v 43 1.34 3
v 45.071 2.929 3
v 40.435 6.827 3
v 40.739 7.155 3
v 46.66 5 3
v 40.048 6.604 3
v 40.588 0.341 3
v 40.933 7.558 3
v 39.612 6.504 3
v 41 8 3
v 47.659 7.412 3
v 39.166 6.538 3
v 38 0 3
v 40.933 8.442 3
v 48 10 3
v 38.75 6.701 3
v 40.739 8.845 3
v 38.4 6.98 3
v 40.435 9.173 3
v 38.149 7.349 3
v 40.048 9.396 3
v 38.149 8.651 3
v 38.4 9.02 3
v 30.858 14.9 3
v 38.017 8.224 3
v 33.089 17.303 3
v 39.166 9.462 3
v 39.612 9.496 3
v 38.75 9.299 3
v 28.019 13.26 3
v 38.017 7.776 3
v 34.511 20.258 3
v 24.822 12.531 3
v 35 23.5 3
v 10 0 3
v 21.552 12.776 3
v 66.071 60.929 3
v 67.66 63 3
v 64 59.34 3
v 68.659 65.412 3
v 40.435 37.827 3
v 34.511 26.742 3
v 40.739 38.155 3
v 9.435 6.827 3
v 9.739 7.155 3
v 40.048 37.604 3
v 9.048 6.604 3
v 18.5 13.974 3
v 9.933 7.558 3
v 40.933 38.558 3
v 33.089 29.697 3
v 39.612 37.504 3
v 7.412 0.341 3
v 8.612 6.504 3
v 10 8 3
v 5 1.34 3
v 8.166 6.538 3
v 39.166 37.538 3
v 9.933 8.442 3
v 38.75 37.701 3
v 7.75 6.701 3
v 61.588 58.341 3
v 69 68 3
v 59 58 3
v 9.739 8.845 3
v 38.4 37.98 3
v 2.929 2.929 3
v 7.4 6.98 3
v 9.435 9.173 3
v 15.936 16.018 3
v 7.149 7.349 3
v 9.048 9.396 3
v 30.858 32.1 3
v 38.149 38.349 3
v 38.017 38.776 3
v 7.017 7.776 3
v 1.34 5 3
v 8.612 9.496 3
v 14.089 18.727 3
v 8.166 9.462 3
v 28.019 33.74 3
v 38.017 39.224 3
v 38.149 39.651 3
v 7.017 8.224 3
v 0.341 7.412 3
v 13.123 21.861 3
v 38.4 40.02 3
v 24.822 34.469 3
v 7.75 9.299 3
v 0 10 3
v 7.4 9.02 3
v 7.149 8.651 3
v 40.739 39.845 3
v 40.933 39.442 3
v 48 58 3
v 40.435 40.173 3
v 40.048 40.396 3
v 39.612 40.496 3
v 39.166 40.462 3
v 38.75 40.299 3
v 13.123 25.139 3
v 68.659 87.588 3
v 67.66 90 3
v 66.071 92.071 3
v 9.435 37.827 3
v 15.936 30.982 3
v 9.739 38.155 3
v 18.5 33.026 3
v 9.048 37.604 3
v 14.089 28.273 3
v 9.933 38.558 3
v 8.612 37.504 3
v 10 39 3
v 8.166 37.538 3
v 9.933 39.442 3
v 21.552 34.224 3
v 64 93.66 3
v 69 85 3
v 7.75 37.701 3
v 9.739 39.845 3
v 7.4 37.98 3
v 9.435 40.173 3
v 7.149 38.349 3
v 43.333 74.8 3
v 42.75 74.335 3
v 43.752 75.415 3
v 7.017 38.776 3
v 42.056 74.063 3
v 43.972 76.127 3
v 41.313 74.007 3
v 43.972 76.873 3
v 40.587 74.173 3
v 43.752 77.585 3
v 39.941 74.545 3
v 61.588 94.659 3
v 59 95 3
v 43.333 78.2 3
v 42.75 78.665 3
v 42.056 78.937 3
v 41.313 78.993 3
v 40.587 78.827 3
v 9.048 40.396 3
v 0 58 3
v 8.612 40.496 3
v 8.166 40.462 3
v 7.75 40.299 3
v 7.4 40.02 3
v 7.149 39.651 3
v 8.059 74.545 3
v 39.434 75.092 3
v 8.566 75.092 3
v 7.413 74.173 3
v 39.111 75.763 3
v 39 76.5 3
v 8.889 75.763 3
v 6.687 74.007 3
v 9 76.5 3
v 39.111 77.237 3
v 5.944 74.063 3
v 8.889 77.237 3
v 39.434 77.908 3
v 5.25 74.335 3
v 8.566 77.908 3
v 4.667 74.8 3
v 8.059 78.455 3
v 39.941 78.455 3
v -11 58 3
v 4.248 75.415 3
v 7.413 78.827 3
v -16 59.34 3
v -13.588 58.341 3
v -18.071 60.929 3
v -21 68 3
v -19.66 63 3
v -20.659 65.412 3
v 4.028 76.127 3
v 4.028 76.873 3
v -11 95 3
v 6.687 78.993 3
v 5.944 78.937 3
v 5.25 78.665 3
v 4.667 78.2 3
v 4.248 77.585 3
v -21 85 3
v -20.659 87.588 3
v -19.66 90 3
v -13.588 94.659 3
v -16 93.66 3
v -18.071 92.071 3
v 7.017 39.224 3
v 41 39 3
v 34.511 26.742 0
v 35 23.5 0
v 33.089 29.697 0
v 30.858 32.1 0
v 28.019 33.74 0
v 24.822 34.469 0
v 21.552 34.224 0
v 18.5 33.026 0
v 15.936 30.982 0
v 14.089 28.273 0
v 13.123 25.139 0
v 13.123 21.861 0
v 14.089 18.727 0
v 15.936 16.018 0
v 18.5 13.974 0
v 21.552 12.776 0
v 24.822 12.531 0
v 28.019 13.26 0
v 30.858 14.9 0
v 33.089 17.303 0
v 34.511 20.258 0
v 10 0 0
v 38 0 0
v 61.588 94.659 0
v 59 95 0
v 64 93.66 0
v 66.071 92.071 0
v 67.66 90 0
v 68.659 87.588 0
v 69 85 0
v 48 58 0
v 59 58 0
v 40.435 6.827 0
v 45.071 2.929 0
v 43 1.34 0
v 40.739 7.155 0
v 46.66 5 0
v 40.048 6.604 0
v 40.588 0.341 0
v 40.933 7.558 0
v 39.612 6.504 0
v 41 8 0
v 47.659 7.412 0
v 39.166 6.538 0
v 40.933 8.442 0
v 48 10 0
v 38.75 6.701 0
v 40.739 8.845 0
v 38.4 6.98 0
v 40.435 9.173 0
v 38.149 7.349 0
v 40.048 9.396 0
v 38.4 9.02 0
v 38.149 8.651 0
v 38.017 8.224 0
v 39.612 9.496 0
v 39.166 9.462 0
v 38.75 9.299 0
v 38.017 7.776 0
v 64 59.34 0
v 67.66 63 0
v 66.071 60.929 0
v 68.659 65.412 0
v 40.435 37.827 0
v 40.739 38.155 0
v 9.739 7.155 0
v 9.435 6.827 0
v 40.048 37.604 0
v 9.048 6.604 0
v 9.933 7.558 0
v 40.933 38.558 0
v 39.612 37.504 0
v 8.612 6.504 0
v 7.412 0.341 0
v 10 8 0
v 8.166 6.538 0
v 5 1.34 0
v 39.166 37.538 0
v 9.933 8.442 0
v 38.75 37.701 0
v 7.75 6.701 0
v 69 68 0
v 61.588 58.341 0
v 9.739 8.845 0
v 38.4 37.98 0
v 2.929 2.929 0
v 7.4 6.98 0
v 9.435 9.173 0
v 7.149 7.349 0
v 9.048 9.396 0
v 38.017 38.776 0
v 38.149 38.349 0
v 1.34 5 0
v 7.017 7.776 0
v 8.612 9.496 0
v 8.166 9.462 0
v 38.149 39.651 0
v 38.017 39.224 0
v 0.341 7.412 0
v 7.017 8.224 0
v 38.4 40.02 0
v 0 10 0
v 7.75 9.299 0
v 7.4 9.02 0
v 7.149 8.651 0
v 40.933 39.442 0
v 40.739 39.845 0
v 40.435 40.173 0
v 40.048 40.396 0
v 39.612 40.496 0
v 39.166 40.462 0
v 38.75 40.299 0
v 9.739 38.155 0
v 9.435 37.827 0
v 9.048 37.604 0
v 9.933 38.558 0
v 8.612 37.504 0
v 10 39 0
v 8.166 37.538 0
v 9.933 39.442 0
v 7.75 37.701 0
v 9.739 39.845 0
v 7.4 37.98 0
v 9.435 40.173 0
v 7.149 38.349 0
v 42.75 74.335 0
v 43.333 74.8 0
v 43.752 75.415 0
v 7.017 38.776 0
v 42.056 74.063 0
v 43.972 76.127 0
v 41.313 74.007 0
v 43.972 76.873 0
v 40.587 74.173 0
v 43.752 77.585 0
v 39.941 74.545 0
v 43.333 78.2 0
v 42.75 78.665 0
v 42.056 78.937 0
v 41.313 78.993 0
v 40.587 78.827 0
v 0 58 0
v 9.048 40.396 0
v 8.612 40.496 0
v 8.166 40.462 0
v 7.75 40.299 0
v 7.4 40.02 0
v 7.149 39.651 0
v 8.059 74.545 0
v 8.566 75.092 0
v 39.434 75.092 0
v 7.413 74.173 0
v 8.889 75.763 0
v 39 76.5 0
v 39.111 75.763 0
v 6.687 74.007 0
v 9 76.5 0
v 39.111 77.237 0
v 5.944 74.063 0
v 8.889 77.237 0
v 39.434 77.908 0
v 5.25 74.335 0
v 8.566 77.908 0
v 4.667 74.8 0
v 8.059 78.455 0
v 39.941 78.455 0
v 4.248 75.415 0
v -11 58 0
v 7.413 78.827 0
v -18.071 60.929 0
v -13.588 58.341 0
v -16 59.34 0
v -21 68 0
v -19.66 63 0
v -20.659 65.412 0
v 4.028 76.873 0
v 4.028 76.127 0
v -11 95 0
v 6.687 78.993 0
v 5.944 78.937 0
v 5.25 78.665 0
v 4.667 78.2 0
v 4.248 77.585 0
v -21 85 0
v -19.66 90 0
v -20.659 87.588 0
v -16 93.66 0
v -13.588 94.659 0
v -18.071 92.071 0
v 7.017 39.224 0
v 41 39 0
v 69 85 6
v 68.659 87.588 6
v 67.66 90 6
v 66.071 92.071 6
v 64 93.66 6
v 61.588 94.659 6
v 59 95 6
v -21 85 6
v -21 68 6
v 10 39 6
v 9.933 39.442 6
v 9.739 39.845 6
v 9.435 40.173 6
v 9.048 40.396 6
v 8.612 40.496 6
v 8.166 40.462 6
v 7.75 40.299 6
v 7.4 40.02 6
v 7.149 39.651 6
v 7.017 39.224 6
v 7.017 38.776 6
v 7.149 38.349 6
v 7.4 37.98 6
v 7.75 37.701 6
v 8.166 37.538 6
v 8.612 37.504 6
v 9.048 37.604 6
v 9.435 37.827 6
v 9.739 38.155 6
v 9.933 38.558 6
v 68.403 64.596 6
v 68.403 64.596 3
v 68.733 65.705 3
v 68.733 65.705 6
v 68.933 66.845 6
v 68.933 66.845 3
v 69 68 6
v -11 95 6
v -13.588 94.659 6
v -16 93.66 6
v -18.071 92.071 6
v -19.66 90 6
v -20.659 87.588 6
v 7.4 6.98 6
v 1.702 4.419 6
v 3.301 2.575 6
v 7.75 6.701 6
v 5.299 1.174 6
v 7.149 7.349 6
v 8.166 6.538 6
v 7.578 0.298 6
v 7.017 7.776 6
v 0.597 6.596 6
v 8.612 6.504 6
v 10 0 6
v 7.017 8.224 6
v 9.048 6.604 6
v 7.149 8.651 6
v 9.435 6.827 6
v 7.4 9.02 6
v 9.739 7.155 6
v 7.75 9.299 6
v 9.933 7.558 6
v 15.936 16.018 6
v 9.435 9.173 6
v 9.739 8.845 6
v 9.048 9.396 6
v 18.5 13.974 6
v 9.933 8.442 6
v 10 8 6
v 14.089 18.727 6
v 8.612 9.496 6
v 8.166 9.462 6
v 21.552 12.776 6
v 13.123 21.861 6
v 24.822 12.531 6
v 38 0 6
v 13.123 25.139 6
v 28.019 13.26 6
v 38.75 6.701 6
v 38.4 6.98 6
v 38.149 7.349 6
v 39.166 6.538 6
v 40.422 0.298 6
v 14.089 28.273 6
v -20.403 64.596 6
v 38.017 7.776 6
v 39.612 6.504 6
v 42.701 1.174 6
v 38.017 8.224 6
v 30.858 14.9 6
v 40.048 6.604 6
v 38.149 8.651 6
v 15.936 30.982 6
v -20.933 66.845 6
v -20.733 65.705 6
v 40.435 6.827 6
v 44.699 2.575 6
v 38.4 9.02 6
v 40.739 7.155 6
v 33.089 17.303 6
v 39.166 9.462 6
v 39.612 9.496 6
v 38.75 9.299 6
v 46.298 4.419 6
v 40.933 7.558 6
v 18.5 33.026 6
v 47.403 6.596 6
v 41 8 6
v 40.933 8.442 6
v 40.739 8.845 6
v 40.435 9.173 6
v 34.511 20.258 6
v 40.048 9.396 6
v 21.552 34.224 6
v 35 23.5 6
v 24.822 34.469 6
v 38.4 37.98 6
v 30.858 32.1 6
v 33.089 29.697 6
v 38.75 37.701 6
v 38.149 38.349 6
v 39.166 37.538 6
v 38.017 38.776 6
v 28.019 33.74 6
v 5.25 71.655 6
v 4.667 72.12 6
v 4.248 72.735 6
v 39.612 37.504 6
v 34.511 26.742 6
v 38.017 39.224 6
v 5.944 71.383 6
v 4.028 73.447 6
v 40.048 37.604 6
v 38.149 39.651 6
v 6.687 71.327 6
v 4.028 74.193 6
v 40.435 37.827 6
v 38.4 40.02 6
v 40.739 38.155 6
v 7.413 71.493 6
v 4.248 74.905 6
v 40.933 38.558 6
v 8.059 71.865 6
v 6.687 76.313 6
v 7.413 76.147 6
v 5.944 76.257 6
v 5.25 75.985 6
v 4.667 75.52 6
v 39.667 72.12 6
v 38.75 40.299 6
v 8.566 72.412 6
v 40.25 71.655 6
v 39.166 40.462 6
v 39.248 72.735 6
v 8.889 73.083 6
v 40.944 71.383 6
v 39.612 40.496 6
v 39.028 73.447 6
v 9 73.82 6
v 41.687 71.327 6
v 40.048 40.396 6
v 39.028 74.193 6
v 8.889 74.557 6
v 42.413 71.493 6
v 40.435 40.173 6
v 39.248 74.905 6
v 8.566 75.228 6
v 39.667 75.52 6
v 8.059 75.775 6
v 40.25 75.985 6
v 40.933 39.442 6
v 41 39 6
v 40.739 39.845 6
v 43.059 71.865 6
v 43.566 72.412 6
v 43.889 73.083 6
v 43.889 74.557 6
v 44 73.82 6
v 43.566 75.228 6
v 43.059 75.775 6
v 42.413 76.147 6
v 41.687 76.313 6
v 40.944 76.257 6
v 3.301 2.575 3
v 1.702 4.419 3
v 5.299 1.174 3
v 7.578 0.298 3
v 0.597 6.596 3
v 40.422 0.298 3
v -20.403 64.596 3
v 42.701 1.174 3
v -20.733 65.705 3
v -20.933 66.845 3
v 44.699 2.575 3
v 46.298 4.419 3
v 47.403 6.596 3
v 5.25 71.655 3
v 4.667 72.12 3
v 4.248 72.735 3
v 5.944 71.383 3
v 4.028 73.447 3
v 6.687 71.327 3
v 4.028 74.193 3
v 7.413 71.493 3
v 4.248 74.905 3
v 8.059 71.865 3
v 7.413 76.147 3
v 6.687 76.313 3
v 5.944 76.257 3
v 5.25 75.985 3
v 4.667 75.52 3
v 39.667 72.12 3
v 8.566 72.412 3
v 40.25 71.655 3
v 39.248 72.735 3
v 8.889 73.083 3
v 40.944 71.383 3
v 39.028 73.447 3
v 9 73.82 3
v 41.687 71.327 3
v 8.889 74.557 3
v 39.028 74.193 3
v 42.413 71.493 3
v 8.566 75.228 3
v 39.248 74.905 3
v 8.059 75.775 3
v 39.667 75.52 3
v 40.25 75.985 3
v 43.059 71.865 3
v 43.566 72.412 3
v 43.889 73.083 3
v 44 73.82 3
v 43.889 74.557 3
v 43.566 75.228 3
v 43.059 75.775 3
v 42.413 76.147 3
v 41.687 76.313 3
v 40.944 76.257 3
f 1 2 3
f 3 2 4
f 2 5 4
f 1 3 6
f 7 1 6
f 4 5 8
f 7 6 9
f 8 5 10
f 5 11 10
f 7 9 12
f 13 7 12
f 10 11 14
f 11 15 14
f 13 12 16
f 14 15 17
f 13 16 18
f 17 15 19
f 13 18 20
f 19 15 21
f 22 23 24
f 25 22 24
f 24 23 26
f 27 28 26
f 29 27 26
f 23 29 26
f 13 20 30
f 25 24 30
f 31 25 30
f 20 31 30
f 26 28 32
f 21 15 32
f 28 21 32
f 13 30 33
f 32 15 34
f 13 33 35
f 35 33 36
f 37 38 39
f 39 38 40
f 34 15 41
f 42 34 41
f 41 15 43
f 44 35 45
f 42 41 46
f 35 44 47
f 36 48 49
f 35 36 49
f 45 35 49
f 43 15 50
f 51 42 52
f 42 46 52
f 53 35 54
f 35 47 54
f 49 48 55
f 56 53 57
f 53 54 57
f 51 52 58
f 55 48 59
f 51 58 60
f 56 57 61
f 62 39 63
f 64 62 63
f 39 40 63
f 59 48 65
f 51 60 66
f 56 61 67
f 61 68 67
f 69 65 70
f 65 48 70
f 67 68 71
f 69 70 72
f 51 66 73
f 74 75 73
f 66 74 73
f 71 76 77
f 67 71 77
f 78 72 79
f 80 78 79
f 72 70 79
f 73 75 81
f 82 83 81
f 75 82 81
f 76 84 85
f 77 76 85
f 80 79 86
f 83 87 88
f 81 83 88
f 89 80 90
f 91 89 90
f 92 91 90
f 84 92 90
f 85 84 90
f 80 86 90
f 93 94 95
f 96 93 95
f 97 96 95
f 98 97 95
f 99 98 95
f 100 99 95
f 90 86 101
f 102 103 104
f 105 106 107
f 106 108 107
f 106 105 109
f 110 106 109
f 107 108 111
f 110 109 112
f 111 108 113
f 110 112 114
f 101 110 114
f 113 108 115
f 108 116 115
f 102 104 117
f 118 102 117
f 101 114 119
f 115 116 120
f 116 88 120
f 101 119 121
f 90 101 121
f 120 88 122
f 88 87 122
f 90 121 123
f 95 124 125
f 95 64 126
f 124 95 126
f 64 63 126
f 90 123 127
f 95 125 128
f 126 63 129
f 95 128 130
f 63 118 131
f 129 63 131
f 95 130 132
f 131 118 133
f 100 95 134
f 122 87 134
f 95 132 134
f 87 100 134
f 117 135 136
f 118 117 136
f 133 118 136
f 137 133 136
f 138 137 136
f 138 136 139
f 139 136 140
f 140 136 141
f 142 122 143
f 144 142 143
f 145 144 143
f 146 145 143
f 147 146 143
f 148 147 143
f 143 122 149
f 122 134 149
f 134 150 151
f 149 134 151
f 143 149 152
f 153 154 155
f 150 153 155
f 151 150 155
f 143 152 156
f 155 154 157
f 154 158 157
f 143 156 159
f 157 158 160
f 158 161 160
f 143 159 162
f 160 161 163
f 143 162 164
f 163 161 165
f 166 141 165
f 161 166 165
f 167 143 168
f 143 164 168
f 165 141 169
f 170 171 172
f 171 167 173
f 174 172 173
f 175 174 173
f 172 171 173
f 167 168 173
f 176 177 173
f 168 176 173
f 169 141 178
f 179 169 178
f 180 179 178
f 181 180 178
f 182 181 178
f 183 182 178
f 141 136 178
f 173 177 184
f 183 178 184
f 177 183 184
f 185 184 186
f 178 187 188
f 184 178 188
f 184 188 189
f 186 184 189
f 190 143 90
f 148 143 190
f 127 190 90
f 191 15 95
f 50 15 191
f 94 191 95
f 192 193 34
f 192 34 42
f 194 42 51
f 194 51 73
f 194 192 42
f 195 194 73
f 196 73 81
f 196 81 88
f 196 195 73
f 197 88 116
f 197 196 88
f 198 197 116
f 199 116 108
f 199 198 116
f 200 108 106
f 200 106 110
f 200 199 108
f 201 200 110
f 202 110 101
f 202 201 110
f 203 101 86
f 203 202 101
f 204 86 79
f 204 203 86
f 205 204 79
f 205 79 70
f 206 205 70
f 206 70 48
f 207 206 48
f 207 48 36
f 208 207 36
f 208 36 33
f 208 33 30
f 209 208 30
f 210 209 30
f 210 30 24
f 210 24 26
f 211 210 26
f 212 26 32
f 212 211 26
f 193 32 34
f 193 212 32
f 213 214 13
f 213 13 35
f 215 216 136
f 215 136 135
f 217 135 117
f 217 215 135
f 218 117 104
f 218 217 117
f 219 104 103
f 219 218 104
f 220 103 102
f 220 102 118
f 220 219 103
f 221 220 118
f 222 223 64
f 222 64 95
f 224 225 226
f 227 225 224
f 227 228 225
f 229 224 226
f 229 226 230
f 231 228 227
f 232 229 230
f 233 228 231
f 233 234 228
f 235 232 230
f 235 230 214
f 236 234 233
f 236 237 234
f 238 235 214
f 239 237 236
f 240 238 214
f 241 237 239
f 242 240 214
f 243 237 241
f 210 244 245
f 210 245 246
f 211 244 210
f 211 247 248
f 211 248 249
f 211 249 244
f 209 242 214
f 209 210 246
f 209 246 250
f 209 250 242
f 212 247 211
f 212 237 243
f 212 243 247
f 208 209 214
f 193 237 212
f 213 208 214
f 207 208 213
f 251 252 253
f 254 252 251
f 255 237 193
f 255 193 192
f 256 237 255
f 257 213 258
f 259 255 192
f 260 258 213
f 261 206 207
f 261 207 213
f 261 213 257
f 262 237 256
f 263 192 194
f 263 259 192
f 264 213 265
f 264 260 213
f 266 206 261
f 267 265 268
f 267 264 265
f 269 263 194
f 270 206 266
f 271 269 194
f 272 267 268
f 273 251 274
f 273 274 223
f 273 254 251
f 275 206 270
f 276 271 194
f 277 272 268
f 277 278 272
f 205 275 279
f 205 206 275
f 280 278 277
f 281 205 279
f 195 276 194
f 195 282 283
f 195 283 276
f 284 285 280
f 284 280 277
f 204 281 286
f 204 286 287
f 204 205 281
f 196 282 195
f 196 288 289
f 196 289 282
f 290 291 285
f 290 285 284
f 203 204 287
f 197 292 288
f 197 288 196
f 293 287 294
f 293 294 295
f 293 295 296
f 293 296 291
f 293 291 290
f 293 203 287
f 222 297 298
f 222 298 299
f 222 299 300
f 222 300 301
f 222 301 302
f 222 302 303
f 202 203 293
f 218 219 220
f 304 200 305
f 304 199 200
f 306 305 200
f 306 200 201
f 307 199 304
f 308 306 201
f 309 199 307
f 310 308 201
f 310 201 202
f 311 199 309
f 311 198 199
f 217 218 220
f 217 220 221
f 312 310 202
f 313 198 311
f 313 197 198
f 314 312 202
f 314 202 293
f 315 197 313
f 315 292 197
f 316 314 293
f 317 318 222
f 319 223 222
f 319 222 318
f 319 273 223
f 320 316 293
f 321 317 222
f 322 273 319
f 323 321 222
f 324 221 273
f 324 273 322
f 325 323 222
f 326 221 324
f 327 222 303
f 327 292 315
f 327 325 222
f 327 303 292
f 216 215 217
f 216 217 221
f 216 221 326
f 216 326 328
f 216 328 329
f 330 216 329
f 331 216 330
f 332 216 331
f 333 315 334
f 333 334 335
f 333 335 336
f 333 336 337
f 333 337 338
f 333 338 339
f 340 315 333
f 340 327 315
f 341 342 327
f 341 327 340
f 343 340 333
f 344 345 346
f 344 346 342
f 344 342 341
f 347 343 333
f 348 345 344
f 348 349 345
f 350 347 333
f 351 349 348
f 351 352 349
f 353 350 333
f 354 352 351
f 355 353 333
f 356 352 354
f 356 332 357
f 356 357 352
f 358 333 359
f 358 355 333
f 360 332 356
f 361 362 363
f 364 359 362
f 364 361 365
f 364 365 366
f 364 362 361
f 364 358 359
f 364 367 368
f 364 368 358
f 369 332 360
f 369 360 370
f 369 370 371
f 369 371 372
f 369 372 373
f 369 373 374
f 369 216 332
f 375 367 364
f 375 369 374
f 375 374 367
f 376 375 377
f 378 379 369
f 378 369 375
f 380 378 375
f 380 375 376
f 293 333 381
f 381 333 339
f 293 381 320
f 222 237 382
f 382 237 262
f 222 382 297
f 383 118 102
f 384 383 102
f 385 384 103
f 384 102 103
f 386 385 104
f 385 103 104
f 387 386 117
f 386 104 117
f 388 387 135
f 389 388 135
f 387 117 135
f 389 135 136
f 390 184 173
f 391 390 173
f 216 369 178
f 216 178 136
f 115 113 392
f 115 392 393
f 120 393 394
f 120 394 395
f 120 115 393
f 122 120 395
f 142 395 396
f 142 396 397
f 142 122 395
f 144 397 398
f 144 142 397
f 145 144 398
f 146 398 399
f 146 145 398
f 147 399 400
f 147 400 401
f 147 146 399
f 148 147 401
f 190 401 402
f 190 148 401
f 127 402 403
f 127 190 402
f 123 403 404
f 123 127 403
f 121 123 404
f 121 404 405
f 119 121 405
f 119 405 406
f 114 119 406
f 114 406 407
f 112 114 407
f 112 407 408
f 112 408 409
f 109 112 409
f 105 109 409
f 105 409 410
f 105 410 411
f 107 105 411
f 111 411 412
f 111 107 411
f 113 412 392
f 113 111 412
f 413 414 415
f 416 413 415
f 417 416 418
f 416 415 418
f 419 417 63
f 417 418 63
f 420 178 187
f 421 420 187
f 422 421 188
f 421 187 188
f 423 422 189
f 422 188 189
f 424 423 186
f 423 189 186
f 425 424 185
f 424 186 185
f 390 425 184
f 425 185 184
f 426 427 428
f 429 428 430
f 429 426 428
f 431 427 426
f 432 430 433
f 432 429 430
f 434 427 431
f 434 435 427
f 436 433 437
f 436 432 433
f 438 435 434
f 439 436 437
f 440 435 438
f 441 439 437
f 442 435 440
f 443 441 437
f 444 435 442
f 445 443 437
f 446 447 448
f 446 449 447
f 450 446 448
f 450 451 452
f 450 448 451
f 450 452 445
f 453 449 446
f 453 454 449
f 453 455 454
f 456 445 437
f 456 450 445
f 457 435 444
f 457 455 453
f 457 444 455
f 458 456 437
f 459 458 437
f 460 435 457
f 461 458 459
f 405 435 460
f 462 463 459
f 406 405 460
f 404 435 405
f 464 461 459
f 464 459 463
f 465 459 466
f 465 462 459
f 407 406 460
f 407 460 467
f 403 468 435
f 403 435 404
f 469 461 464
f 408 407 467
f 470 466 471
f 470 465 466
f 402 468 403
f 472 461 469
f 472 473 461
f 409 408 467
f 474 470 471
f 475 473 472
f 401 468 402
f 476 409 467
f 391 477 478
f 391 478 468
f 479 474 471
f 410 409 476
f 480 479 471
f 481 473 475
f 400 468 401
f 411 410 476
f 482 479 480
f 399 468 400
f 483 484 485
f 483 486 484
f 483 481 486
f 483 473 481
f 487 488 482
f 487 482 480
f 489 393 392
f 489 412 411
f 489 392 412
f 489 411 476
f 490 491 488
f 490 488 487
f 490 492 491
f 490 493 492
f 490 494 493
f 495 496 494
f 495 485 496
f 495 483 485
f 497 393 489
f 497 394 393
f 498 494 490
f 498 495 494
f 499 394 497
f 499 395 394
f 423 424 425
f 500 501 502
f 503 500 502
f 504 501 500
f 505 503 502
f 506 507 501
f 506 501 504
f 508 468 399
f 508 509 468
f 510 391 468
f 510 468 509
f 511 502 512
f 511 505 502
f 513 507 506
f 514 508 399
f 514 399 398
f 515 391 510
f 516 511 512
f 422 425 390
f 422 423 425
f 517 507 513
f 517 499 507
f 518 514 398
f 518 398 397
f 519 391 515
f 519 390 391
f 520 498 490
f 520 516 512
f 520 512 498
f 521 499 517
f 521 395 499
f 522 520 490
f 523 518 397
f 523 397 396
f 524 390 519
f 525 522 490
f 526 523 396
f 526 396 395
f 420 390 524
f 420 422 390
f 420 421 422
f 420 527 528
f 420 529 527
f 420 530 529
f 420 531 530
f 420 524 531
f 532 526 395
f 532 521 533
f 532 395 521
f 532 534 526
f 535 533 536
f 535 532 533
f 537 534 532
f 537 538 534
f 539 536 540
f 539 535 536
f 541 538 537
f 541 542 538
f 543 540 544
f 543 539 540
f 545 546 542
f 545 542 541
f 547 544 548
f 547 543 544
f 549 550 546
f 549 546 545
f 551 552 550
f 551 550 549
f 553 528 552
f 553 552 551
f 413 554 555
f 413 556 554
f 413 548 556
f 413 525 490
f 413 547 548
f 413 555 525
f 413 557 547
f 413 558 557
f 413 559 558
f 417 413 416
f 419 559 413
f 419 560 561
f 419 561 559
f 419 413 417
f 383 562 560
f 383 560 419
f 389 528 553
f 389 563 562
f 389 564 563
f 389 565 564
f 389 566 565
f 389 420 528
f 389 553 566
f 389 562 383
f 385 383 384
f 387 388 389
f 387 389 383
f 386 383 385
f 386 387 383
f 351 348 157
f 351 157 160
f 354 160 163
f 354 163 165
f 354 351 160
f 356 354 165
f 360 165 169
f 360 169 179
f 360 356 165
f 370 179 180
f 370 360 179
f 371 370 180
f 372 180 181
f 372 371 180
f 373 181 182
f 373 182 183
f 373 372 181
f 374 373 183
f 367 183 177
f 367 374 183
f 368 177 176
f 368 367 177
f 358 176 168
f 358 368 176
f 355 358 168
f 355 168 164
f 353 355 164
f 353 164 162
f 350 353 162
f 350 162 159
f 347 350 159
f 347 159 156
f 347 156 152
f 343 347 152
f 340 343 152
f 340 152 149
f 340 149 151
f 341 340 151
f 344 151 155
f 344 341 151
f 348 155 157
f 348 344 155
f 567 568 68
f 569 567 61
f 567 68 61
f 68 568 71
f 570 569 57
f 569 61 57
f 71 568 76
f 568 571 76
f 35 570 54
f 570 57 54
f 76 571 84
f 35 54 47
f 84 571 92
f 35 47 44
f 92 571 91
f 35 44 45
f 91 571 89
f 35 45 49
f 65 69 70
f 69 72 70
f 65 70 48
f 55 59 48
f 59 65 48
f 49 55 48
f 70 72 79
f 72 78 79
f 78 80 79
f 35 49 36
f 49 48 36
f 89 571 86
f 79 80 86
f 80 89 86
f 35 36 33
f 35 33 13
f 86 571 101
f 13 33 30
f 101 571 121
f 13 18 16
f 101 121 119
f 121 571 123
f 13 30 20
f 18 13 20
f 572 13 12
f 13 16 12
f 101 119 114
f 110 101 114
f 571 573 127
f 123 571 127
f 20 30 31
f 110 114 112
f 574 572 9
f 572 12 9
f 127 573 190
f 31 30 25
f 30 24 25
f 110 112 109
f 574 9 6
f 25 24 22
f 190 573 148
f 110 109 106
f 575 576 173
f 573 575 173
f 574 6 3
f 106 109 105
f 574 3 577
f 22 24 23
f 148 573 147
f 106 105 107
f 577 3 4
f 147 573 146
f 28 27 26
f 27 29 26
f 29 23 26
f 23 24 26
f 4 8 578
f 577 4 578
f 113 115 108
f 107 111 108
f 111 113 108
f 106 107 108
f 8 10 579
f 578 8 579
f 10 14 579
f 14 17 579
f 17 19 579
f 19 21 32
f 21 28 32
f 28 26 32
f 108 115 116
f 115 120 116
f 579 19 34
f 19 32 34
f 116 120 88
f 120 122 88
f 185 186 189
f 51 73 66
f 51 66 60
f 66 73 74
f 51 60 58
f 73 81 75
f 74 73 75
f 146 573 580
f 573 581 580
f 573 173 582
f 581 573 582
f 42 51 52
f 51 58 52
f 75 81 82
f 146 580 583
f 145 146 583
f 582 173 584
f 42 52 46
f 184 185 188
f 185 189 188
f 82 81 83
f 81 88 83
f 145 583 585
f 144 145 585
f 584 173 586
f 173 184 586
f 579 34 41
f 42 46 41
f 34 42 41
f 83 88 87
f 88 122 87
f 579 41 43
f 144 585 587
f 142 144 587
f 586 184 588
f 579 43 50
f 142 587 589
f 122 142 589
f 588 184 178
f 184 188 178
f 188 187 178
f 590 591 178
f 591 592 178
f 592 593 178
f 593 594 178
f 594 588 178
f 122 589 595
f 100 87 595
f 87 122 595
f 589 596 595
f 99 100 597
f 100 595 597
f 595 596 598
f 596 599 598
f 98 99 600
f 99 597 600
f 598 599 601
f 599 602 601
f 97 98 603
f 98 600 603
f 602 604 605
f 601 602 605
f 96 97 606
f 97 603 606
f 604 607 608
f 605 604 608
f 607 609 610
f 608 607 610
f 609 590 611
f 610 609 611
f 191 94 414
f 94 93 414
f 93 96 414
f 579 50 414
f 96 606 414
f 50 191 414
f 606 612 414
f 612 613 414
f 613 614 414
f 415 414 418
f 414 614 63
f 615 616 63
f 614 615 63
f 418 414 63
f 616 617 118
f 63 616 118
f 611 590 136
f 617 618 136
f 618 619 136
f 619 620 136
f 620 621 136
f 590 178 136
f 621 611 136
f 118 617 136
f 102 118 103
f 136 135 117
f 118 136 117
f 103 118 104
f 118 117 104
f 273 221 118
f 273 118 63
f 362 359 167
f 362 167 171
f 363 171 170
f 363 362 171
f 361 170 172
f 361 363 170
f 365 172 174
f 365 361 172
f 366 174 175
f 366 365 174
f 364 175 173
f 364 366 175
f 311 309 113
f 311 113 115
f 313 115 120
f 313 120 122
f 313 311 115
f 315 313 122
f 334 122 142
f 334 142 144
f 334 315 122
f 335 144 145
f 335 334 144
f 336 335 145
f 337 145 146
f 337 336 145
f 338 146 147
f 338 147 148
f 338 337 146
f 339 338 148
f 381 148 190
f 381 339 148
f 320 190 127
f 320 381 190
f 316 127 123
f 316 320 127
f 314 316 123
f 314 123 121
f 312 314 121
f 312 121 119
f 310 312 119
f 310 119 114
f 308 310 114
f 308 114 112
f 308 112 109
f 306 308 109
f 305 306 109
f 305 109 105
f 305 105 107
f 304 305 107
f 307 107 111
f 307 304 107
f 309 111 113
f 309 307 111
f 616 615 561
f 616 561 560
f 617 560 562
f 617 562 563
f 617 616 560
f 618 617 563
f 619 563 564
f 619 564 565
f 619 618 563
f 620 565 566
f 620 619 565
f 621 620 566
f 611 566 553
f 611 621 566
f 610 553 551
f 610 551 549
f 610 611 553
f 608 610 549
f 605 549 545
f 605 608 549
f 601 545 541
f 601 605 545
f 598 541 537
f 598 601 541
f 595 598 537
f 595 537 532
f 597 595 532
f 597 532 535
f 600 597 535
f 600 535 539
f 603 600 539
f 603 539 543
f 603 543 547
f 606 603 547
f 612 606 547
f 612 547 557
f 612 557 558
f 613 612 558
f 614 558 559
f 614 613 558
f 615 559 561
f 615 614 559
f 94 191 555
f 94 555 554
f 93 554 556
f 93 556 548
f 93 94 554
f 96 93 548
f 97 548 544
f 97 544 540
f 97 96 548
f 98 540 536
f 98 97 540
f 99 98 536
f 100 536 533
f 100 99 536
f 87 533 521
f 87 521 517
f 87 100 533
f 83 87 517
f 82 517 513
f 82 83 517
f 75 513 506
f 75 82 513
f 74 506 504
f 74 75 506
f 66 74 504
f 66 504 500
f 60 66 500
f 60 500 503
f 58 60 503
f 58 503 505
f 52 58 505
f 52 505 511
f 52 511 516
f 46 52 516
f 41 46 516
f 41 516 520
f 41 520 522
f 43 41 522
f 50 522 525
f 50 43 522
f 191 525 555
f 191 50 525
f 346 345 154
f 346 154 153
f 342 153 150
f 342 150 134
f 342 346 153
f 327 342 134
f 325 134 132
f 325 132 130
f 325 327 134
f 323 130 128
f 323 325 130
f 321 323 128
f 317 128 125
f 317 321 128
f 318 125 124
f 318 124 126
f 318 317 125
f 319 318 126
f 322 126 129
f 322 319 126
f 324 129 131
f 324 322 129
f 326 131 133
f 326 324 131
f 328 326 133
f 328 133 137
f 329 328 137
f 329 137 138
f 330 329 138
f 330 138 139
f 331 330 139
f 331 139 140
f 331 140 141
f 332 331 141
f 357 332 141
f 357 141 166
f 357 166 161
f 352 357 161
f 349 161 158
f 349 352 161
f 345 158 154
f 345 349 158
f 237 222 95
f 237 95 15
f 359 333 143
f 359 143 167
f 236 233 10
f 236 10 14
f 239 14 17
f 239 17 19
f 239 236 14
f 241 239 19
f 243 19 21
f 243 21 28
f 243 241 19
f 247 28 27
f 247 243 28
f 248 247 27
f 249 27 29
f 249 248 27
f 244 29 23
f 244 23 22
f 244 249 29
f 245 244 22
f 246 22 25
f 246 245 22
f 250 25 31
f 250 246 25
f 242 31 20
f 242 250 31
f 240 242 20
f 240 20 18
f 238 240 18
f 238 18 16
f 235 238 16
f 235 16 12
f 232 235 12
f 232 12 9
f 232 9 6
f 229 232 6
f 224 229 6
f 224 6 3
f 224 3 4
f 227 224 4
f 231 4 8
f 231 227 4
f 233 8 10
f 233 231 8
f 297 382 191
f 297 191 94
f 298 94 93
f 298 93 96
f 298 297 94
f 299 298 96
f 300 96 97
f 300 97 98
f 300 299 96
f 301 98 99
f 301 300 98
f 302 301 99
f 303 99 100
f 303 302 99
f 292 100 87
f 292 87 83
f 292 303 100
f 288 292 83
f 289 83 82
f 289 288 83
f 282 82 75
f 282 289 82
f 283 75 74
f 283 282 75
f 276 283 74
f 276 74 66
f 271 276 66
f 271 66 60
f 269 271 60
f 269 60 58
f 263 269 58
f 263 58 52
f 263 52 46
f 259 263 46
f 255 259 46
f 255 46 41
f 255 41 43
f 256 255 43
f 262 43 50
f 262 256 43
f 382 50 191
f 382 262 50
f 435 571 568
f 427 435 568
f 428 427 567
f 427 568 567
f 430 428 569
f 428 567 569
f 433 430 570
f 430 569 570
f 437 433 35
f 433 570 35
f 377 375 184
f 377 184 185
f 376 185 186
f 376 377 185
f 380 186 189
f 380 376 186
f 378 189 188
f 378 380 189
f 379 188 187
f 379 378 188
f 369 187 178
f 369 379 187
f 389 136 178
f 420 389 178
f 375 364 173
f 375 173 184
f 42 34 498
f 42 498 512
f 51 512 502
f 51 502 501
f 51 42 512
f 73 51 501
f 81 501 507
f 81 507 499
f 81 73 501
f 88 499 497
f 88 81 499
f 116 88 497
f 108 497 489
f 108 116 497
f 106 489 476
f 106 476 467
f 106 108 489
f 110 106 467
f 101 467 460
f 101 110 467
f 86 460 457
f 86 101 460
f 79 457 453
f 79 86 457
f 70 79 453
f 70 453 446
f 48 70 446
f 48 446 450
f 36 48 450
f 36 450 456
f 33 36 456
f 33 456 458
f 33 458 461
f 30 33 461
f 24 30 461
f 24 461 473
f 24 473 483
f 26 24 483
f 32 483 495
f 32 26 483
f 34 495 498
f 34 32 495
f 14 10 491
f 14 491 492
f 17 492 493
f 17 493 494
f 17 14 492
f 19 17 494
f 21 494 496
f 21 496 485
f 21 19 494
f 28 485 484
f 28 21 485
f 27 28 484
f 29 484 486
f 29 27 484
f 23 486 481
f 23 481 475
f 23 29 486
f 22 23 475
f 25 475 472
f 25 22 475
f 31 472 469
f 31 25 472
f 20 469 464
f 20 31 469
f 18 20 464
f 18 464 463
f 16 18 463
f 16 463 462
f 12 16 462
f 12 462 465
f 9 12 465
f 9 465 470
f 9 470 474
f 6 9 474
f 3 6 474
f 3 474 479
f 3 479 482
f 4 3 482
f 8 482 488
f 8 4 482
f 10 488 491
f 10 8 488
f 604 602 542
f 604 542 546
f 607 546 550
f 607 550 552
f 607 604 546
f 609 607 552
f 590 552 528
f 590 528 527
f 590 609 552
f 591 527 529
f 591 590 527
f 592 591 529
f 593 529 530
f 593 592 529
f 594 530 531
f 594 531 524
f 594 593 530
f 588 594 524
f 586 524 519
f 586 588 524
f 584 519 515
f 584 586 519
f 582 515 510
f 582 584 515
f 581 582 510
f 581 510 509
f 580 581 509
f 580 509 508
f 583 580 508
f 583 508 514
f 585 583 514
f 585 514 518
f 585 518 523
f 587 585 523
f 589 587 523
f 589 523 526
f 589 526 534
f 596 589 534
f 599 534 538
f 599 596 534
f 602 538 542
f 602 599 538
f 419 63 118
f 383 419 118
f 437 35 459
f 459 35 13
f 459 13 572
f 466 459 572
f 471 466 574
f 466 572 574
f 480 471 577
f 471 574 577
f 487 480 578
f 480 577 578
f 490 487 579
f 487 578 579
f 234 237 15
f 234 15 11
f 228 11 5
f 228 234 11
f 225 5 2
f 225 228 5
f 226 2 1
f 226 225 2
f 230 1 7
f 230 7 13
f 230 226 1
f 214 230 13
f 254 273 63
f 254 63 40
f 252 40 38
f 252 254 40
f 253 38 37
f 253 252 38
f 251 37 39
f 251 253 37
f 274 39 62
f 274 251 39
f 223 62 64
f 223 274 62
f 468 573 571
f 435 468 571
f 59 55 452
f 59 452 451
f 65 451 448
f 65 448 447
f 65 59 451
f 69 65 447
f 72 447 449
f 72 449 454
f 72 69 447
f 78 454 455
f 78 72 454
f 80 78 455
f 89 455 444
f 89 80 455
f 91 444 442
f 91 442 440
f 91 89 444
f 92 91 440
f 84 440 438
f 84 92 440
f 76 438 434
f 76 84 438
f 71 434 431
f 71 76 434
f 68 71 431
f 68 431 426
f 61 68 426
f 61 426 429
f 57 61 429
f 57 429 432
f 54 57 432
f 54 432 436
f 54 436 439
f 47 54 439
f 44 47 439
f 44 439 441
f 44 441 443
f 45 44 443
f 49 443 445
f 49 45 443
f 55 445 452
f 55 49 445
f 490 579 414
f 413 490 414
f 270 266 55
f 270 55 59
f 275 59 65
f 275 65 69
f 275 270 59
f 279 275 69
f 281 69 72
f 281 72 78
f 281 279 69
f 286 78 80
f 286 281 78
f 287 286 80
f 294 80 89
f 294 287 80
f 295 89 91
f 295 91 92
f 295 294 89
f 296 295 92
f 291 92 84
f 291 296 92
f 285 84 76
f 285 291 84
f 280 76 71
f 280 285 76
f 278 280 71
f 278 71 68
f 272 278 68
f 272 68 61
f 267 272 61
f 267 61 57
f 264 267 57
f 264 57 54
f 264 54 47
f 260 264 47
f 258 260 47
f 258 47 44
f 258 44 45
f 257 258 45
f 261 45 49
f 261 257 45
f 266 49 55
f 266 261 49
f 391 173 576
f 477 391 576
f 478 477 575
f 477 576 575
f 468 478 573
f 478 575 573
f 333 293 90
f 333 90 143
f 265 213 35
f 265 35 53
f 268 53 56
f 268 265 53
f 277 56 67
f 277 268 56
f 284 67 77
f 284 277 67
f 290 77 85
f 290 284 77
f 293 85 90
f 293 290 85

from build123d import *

# Parameters (mm, degrees)
CROQUIS1_R              = 1.5
CROQUIS1_R_2            = 2.5
CROQUIS1_R_3            = 11
SALIENTE_EXTRUIR1_DEPTH = 3
CROQUIS2_R              = 2.5
CROQUIS2_R_2            = 1.5
CROQUIS2_R_3            = 11
SALIENTE_EXTRUIR2_DEPTH = 3


with BuildPart() as part:
    # Croquis1 → Saliente-Extruir1 (new body)
    with BuildSketch(Plane.XY):
        with BuildLine():
            Line((0, 10), (0, 58))
            Line((0, 58), (-11, 58))
            ThreePointArc((-11, 58), (-18.071067812, 60.928932188), (-21, 68))
            Line((-21, 68), (-21, 85))
            ThreePointArc((-21, 85), (-18.071067812, 92.071067812), (-11, 95))
            Line((-11, 95), (59, 95))
            ThreePointArc((59, 95), (66.071067812, 92.071067812), (69, 85))
            Line((69, 85), (69, 68))
            ThreePointArc((69, 68), (66.071067812, 60.928932188), (59, 58))
            Line((59, 58), (48, 58))
            Line((48, 58), (48, 10))
            ThreePointArc((48, 10), (45.071067812, 2.928932188), (38, 0))
            Line((38, 0), (10, 0))
            ThreePointArc((10, 0), (2.928932188, 2.928932188), (0, 10))
        make_face()
        with Locations((8.5, 39)):
            Circle(CROQUIS1_R, mode=Mode.SUBTRACT)
        with Locations((39.5, 39)):
            Circle(CROQUIS1_R, mode=Mode.SUBTRACT)
        with Locations((39.5, 8)):
            Circle(CROQUIS1_R, mode=Mode.SUBTRACT)
        with Locations((8.5, 8)):
            Circle(CROQUIS1_R, mode=Mode.SUBTRACT)
        with Locations((6.5, 76.5)):
            Circle(CROQUIS1_R_2, mode=Mode.SUBTRACT)
        with Locations(Location((41.5, 76.5, 0), (0, 0, 180))):
            Circle(CROQUIS1_R_2, mode=Mode.SUBTRACT)
        with Locations((24, 23.5)):
            Circle(CROQUIS1_R_3, mode=Mode.SUBTRACT)
    extrude(amount=SALIENTE_EXTRUIR1_DEPTH)


with BuildPart() as body_2:
    # Croquis2 → Saliente-Extruir2 (new body)
    with BuildSketch(Plane.XY.offset(3)):
        with BuildLine():
            Line((-20.4026585, 64.595589164), (0.5973415, 6.595589164))
            ThreePointArc((0.5973415, 6.595589164), (4.257357244, 1.813300165), (10, 0))
            Line((10, 0), (38, 0))
            ThreePointArc((38, 0), (43.742642756, 1.813300165), (47.4026585, 6.595589164))
            Line((47.4026585, 6.595589164), (68.4026585, 64.595589164))
            ThreePointArc((68.4026585, 64.595589164), (68.849532603, 66.271790666), (69, 68))
            Line((69, 68), (69, 85))
            ThreePointArc((69, 85), (66.071067812, 92.071067812), (59, 95))
            Line((59, 95), (-11, 95))
            ThreePointArc((-11, 95), (-18.071067812, 92.071067812), (-21, 85))
            Line((-21, 85), (-21, 68))
            ThreePointArc((-21, 68), (-20.849532603, 66.271790666), (-20.4026585, 64.595589164))
        make_face()
        with Locations((41.5, 73.82)):
            Circle(CROQUIS2_R, mode=Mode.SUBTRACT)
        with Locations((8.5, 8)):
            Circle(CROQUIS2_R_2, mode=Mode.SUBTRACT)
        with Locations((8.5, 39)):
            Circle(CROQUIS2_R_2, mode=Mode.SUBTRACT)
        with Locations((39.5, 8)):
            Circle(CROQUIS2_R_2, mode=Mode.SUBTRACT)
        with Locations((24, 23.5)):
            Circle(CROQUIS2_R_3, mode=Mode.SUBTRACT)
        with Locations((39.5, 39)):
            Circle(CROQUIS2_R_2, mode=Mode.SUBTRACT)
        with Locations((6.5, 73.82)):
            Circle(CROQUIS2_R, mode=Mode.SUBTRACT)
    extrude(amount=SALIENTE_EXTRUIR2_DEPTH)


solid = Compound([part.part, body_2.part])
